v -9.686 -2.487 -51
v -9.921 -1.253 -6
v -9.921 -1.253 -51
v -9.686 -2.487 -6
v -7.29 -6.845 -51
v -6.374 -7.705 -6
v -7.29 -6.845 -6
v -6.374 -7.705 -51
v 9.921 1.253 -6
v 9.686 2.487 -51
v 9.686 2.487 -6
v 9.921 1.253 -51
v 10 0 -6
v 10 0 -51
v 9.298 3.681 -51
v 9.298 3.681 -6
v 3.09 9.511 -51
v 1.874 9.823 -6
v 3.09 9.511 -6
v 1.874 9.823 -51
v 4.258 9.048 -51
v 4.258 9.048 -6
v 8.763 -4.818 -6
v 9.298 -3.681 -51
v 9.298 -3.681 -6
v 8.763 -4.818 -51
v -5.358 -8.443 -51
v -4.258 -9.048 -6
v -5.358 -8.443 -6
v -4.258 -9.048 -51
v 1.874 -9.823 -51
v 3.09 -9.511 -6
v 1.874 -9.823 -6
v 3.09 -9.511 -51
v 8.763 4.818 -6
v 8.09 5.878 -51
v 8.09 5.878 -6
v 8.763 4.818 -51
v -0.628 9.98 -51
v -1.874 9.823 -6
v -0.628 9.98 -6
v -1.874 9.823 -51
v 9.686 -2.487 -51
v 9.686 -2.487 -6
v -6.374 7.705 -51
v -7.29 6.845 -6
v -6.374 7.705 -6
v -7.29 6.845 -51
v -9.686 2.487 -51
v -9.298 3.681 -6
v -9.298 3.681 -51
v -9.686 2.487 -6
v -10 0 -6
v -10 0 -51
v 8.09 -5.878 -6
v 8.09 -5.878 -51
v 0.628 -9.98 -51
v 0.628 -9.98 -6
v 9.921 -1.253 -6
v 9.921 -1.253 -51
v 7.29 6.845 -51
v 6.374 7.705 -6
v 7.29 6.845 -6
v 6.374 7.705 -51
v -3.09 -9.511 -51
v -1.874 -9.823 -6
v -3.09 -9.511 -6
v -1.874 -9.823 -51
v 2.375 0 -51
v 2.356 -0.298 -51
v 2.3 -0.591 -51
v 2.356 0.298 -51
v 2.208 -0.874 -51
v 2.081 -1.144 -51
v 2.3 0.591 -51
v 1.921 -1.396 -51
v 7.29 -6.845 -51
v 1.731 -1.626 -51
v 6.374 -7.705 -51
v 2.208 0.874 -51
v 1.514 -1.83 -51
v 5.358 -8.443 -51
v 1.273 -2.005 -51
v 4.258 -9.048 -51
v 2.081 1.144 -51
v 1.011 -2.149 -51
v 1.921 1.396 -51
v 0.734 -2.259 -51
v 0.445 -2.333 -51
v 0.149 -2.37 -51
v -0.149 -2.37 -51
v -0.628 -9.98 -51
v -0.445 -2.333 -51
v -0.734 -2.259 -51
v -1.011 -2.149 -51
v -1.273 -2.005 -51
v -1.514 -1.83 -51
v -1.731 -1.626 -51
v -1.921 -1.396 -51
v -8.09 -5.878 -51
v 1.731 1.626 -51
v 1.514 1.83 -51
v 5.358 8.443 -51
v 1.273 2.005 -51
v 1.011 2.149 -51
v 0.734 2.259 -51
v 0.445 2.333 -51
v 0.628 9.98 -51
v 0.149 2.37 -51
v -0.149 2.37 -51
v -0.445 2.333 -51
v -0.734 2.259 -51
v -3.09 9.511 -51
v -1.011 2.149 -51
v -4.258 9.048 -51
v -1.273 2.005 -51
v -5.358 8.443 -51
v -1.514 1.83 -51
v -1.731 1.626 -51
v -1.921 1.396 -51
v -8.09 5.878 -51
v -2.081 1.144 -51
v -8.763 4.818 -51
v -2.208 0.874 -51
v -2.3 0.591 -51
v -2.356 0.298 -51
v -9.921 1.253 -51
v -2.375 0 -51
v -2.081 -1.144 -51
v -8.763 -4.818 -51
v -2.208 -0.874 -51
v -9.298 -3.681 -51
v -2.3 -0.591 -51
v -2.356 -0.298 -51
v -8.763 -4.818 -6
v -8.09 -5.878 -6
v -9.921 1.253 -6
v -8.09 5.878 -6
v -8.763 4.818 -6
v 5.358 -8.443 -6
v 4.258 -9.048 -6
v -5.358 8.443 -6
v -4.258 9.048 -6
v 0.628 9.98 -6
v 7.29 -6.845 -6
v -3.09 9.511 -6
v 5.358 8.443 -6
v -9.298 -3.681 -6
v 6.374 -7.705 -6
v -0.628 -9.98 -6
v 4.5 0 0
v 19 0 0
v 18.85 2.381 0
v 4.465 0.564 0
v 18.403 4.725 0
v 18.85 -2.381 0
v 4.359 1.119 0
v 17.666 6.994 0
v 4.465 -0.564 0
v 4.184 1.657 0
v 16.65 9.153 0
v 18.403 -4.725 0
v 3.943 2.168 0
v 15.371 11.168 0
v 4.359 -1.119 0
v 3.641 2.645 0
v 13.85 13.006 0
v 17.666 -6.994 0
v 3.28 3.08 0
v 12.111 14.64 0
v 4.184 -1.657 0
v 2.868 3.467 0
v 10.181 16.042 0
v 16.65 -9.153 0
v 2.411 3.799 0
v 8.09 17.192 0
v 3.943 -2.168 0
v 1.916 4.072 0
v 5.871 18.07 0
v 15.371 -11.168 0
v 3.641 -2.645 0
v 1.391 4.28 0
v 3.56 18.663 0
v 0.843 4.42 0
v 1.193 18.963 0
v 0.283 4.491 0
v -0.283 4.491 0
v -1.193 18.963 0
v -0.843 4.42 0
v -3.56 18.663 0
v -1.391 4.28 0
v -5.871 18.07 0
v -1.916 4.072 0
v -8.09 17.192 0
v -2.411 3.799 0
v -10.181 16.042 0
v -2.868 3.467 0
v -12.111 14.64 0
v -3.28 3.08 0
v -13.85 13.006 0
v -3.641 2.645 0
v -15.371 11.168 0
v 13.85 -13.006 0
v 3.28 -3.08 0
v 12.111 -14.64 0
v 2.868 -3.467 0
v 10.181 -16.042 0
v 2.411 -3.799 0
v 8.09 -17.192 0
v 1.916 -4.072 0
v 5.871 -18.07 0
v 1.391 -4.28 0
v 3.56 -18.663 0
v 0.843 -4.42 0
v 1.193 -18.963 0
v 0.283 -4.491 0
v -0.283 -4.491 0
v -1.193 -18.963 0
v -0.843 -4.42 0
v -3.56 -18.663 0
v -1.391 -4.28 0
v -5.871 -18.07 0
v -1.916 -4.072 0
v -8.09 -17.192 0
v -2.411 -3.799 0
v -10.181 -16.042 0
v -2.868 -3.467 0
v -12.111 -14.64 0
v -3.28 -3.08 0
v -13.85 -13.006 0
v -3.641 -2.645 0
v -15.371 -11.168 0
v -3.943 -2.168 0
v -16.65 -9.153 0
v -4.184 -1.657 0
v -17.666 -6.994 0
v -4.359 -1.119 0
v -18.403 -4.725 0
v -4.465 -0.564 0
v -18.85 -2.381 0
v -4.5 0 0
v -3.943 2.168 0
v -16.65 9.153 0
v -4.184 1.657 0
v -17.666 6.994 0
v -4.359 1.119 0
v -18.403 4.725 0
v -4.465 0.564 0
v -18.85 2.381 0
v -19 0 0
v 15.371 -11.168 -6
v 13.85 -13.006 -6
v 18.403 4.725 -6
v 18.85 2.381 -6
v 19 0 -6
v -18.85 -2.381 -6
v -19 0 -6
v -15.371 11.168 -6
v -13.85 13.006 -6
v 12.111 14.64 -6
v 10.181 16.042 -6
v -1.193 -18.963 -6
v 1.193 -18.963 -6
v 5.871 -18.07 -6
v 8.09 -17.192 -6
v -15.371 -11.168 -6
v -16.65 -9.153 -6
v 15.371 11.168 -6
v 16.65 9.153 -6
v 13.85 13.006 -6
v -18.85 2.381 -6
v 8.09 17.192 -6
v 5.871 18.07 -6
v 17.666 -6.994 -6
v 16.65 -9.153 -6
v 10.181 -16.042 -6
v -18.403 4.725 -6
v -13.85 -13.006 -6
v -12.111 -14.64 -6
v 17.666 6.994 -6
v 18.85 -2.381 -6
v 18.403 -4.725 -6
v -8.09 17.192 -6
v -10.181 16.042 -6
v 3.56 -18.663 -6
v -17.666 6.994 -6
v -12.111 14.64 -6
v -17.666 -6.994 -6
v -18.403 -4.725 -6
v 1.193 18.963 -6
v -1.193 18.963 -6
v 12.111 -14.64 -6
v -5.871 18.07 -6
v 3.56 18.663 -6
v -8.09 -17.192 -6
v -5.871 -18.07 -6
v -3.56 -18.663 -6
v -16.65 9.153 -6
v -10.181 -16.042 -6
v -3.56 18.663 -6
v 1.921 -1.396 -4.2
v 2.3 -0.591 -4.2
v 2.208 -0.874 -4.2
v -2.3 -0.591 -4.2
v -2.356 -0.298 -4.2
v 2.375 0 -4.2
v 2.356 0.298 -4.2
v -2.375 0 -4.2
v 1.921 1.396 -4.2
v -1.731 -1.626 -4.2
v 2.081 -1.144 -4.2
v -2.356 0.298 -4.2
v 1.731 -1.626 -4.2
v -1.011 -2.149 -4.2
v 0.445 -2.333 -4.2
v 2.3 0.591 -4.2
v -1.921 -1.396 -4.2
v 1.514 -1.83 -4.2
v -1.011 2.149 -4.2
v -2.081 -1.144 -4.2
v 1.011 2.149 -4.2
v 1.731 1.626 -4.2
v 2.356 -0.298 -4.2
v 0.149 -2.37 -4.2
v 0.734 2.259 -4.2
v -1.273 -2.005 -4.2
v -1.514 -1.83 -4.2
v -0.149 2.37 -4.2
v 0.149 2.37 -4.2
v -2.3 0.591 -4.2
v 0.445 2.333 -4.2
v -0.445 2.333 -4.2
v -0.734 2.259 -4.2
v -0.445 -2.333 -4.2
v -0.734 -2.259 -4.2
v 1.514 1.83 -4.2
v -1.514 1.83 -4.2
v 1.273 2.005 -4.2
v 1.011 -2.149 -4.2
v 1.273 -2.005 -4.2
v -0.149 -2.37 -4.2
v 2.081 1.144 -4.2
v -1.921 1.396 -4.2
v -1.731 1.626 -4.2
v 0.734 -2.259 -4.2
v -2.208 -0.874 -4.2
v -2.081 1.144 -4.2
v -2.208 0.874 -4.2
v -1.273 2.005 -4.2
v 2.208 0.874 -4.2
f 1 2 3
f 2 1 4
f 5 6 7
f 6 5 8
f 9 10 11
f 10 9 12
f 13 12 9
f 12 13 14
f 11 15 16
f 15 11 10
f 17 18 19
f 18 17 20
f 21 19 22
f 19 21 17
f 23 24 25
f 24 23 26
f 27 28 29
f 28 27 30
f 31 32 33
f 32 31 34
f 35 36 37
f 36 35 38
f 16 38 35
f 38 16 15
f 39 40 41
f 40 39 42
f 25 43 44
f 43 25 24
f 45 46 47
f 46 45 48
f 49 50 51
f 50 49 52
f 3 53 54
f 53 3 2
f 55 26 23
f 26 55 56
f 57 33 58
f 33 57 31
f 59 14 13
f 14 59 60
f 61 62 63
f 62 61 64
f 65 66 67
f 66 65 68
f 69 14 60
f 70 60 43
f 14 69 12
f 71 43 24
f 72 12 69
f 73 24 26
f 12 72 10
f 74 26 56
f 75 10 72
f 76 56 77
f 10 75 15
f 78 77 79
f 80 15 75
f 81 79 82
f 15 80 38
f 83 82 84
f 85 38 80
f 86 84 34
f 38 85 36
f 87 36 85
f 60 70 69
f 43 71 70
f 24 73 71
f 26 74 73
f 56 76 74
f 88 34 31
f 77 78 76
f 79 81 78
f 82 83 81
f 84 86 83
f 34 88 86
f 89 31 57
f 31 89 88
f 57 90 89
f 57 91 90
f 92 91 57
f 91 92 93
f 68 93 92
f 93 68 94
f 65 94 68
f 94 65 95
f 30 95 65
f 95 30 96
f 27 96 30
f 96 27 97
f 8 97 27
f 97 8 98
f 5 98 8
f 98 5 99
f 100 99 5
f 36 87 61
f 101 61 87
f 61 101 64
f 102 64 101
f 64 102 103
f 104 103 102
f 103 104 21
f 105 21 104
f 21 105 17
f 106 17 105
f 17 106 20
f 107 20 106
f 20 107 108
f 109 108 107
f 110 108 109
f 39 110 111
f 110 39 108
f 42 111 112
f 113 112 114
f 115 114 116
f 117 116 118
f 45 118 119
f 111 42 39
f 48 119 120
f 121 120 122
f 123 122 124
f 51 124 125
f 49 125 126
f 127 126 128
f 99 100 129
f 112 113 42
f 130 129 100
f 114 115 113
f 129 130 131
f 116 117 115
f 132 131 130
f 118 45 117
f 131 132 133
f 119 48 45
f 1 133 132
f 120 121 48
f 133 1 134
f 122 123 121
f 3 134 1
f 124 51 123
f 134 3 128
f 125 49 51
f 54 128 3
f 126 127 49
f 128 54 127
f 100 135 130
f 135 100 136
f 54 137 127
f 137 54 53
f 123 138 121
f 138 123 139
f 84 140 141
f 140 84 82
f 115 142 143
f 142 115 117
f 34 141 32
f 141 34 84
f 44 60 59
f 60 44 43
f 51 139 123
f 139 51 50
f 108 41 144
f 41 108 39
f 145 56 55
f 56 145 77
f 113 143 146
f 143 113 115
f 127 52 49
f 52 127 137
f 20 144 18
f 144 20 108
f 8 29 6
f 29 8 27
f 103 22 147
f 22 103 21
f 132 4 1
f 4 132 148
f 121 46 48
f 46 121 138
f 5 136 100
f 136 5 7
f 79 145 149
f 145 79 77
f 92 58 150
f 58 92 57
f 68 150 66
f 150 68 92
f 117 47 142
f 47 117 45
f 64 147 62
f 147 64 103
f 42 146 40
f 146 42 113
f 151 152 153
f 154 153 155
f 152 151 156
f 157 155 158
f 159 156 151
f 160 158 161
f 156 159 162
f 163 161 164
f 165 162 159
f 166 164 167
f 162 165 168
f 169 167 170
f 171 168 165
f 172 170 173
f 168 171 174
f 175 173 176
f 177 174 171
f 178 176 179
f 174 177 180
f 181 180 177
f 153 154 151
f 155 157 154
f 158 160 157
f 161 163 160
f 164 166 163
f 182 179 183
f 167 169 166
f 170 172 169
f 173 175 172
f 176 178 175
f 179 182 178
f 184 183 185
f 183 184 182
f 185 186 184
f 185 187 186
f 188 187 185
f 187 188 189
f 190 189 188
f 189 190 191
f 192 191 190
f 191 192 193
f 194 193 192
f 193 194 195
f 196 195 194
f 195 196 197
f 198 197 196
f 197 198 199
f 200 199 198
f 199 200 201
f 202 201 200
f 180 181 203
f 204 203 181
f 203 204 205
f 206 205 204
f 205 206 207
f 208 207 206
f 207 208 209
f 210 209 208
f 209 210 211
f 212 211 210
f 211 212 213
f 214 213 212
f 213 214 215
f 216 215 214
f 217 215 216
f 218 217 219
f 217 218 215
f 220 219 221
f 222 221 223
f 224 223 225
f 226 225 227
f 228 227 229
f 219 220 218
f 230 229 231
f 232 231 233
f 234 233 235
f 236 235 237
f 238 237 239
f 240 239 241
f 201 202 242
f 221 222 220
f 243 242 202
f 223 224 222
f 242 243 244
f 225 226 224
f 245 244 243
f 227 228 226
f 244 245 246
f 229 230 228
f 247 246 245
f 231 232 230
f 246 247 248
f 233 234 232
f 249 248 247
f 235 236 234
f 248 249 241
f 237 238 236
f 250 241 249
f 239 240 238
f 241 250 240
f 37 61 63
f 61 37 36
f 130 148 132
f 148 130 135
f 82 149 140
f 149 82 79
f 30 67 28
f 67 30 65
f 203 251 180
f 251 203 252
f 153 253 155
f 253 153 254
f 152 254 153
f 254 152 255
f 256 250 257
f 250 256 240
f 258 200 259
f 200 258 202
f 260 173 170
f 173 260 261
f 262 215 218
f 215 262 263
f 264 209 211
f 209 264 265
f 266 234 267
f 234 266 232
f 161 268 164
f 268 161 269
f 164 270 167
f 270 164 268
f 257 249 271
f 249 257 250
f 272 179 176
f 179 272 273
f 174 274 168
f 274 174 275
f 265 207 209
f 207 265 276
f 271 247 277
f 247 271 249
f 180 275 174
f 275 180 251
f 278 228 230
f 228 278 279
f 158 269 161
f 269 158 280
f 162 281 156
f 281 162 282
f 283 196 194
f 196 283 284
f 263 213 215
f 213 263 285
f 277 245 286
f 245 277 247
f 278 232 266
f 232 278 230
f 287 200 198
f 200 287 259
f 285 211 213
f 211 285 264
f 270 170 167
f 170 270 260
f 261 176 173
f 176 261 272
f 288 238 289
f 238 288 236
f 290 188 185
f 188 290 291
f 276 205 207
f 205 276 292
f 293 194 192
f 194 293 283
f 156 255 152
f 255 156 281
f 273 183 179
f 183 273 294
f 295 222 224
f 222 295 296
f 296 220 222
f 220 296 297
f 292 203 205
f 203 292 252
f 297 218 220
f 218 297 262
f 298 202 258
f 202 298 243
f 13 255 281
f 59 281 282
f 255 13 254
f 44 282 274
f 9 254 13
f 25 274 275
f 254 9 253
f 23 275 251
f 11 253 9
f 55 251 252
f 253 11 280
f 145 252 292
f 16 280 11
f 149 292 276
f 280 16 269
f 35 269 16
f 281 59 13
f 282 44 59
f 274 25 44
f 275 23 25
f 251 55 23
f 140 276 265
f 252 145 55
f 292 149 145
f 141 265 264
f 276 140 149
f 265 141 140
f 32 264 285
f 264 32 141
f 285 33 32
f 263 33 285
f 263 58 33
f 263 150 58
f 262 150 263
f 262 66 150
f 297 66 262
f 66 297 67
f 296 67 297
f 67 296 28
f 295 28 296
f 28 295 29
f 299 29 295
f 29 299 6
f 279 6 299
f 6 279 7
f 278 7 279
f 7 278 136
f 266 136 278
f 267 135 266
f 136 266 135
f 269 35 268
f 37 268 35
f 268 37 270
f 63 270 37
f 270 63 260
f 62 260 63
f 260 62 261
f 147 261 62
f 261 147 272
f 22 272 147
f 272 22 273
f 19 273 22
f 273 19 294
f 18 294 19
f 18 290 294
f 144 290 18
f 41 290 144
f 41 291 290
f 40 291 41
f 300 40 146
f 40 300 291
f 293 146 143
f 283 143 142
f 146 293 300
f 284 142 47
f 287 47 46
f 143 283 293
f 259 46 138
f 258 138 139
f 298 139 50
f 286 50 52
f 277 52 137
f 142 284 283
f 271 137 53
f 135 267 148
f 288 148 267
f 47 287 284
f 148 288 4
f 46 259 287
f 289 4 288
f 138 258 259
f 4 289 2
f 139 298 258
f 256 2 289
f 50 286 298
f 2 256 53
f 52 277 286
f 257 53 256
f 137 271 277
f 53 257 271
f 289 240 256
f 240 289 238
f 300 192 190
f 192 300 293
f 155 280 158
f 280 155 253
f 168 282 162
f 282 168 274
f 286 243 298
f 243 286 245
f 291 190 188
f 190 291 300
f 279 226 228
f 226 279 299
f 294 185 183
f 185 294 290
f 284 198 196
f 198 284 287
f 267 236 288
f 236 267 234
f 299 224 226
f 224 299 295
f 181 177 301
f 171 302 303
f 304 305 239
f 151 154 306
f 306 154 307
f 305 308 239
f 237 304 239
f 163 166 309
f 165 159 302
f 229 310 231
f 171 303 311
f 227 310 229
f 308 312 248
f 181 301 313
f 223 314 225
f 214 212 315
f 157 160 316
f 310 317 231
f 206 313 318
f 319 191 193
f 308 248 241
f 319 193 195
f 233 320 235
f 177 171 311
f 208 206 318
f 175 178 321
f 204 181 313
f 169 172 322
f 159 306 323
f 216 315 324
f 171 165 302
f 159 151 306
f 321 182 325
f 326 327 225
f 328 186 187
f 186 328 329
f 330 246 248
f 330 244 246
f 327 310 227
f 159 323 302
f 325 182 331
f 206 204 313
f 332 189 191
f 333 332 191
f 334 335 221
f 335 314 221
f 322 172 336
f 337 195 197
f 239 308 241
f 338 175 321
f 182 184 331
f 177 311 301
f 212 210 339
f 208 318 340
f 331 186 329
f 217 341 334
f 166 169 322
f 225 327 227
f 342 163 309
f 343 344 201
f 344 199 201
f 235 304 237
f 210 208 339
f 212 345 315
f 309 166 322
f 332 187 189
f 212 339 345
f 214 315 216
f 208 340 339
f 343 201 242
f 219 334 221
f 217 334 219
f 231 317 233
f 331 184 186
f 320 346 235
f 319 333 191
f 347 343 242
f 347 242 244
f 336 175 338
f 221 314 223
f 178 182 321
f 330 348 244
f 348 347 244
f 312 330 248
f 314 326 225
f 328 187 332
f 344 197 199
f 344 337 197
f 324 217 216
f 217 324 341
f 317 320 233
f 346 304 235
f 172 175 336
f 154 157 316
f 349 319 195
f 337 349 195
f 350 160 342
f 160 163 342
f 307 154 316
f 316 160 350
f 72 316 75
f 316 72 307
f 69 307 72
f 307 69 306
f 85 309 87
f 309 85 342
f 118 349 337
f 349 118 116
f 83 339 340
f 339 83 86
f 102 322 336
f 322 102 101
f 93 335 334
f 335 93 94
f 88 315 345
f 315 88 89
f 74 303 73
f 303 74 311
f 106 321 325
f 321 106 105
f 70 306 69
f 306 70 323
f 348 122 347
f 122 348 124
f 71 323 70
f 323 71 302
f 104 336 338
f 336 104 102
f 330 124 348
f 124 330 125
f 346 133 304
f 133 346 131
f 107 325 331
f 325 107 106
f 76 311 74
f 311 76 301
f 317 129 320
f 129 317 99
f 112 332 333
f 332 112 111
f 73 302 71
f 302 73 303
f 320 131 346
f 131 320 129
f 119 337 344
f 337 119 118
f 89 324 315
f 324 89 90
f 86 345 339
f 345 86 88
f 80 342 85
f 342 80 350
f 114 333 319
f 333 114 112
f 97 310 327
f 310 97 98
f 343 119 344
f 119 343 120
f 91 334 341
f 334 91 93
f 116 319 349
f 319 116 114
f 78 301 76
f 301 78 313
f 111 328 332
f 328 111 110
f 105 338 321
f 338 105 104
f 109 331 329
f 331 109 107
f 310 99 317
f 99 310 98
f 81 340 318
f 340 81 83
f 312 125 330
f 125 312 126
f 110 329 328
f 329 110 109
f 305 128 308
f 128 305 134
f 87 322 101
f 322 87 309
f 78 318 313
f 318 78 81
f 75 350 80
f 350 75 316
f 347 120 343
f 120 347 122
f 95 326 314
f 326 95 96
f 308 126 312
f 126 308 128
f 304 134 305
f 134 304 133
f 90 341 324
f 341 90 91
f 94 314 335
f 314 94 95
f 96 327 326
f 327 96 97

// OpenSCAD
$fn = 50;


difference() {
	union() {
		translate(v = [0, 0, -51.0000000000]) {
			cylinder(h = 51, r = 10.0000000000);
		}
		translate(v = [0, 0, -6.0000000000]) {
			cylinder(h = 6, r = 19.0000000000);
		}
	}
	union() {
		translate(v = [0, 0, 0]) {
			rotate(a = [0, 0, 0]) {
				difference() {
					union() {
						#translate(v = [0, 0, -51.0000000000]) {
							cylinder(h = 51, r = 2.2500000000);
						}
						#translate(v = [0, 0, -4.2000000000]) {
							cylinder(h = 4.2000000000, r = 10.0000000000, r1 = 2.3750000000, r2 = 4.5000000000);
						}
						#translate(v = [0, 0, -51.0000000000]) {
							cylinder(h = 51, r = 2.3750000000);
						}
						#translate(v = [0, 0, -51.0000000000]) {
							cylinder(h = 51, r = 2.2500000000);
						}
					}
					union();
				}
			}
		}
	}
}
